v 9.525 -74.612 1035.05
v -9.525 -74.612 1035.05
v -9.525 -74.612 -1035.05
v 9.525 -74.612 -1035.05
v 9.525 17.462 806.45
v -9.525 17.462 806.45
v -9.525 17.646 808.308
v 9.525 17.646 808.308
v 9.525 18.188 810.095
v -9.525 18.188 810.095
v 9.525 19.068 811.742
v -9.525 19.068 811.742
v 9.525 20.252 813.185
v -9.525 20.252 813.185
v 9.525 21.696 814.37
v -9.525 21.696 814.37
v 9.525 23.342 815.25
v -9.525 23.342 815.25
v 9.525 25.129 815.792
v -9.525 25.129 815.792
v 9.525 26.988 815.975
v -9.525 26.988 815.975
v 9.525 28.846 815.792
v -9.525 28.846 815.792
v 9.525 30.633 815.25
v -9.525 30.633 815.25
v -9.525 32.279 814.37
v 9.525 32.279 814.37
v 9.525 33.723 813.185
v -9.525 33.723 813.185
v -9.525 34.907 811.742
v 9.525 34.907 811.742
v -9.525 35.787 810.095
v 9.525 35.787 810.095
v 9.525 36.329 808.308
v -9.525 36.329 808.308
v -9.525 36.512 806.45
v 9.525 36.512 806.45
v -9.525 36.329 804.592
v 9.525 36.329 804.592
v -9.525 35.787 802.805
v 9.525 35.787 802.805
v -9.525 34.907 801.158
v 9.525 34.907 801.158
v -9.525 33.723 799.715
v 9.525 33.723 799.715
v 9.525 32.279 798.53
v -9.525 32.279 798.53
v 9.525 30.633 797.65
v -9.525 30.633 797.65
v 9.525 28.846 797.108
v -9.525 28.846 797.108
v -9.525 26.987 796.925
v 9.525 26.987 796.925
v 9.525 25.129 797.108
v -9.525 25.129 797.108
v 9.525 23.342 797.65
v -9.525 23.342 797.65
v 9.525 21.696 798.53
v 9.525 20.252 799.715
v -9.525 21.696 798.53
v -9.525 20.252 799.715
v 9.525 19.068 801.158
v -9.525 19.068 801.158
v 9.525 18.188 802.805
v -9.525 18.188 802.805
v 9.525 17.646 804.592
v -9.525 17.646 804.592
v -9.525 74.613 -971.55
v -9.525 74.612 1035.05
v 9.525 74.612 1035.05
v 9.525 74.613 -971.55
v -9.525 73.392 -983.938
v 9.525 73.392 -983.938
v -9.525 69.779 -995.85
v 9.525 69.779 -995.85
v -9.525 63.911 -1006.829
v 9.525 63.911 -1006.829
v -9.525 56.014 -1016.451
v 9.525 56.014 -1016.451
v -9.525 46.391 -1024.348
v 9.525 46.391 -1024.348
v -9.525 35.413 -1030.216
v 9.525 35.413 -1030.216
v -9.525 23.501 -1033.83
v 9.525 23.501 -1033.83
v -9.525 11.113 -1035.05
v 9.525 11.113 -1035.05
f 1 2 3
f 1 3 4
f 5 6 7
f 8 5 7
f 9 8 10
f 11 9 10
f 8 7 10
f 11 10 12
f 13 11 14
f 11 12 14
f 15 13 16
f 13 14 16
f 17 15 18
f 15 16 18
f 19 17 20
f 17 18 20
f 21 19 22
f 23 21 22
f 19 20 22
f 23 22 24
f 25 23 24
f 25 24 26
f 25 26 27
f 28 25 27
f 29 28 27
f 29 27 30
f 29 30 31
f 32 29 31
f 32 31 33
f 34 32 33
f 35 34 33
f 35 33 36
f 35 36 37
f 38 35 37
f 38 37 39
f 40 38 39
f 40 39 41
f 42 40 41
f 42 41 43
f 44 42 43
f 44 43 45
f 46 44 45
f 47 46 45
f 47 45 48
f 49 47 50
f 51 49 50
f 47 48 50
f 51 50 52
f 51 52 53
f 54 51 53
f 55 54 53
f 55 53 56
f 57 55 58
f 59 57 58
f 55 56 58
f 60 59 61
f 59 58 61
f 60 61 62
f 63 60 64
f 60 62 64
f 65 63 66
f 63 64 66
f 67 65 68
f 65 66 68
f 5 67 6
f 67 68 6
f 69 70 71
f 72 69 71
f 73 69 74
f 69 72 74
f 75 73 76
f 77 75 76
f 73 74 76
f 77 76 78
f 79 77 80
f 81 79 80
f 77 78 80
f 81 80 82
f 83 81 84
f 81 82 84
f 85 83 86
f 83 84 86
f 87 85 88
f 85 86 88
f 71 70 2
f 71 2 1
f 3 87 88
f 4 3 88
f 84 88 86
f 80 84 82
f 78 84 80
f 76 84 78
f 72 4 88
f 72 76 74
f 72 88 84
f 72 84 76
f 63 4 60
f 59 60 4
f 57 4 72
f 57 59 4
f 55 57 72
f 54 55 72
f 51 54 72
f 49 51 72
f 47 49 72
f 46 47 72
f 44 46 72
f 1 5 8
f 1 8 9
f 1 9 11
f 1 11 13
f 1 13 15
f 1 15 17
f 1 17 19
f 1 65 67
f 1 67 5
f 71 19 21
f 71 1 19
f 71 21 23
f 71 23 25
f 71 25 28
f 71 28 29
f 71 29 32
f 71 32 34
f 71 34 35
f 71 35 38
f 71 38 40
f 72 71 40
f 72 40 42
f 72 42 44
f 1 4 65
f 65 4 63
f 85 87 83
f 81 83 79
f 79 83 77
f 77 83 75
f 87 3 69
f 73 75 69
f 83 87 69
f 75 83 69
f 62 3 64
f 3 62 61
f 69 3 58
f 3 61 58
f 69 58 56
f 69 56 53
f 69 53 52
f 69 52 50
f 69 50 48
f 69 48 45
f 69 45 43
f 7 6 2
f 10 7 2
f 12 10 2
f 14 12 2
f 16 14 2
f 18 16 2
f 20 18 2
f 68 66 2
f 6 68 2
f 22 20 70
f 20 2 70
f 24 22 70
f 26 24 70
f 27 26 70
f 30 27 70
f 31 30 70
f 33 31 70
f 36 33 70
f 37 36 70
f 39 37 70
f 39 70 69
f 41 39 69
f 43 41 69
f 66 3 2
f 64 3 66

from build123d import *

# Parameters (mm, degrees)
F0_W     = 19.05
F0_H     = 149.225
F1_DEPTH = 1035.05
F2_R     = 63.5
F4_D     = 19.05


with BuildPart() as f1:
    # F0 (on Top) → F1 (new body, symmetric)
    with BuildSketch(Plane.XY):
        Rectangle(F0_W, F0_H)
    extrude(amount=F1_DEPTH, both=True)

    # F2
    f2_edges = [f1.edges().sort_by_distance(p)[0] for p in [
        (0, 74.6125, -1035.05),
    ]]
    fillet(f2_edges, radius=F2_R)

    # F4 (through all)
    with Locations(Plane.YZ.offset(9.525)):
        with Locations((26.9875, 806.45)):
            Hole(F4_D / 2)


solid = f1.part
